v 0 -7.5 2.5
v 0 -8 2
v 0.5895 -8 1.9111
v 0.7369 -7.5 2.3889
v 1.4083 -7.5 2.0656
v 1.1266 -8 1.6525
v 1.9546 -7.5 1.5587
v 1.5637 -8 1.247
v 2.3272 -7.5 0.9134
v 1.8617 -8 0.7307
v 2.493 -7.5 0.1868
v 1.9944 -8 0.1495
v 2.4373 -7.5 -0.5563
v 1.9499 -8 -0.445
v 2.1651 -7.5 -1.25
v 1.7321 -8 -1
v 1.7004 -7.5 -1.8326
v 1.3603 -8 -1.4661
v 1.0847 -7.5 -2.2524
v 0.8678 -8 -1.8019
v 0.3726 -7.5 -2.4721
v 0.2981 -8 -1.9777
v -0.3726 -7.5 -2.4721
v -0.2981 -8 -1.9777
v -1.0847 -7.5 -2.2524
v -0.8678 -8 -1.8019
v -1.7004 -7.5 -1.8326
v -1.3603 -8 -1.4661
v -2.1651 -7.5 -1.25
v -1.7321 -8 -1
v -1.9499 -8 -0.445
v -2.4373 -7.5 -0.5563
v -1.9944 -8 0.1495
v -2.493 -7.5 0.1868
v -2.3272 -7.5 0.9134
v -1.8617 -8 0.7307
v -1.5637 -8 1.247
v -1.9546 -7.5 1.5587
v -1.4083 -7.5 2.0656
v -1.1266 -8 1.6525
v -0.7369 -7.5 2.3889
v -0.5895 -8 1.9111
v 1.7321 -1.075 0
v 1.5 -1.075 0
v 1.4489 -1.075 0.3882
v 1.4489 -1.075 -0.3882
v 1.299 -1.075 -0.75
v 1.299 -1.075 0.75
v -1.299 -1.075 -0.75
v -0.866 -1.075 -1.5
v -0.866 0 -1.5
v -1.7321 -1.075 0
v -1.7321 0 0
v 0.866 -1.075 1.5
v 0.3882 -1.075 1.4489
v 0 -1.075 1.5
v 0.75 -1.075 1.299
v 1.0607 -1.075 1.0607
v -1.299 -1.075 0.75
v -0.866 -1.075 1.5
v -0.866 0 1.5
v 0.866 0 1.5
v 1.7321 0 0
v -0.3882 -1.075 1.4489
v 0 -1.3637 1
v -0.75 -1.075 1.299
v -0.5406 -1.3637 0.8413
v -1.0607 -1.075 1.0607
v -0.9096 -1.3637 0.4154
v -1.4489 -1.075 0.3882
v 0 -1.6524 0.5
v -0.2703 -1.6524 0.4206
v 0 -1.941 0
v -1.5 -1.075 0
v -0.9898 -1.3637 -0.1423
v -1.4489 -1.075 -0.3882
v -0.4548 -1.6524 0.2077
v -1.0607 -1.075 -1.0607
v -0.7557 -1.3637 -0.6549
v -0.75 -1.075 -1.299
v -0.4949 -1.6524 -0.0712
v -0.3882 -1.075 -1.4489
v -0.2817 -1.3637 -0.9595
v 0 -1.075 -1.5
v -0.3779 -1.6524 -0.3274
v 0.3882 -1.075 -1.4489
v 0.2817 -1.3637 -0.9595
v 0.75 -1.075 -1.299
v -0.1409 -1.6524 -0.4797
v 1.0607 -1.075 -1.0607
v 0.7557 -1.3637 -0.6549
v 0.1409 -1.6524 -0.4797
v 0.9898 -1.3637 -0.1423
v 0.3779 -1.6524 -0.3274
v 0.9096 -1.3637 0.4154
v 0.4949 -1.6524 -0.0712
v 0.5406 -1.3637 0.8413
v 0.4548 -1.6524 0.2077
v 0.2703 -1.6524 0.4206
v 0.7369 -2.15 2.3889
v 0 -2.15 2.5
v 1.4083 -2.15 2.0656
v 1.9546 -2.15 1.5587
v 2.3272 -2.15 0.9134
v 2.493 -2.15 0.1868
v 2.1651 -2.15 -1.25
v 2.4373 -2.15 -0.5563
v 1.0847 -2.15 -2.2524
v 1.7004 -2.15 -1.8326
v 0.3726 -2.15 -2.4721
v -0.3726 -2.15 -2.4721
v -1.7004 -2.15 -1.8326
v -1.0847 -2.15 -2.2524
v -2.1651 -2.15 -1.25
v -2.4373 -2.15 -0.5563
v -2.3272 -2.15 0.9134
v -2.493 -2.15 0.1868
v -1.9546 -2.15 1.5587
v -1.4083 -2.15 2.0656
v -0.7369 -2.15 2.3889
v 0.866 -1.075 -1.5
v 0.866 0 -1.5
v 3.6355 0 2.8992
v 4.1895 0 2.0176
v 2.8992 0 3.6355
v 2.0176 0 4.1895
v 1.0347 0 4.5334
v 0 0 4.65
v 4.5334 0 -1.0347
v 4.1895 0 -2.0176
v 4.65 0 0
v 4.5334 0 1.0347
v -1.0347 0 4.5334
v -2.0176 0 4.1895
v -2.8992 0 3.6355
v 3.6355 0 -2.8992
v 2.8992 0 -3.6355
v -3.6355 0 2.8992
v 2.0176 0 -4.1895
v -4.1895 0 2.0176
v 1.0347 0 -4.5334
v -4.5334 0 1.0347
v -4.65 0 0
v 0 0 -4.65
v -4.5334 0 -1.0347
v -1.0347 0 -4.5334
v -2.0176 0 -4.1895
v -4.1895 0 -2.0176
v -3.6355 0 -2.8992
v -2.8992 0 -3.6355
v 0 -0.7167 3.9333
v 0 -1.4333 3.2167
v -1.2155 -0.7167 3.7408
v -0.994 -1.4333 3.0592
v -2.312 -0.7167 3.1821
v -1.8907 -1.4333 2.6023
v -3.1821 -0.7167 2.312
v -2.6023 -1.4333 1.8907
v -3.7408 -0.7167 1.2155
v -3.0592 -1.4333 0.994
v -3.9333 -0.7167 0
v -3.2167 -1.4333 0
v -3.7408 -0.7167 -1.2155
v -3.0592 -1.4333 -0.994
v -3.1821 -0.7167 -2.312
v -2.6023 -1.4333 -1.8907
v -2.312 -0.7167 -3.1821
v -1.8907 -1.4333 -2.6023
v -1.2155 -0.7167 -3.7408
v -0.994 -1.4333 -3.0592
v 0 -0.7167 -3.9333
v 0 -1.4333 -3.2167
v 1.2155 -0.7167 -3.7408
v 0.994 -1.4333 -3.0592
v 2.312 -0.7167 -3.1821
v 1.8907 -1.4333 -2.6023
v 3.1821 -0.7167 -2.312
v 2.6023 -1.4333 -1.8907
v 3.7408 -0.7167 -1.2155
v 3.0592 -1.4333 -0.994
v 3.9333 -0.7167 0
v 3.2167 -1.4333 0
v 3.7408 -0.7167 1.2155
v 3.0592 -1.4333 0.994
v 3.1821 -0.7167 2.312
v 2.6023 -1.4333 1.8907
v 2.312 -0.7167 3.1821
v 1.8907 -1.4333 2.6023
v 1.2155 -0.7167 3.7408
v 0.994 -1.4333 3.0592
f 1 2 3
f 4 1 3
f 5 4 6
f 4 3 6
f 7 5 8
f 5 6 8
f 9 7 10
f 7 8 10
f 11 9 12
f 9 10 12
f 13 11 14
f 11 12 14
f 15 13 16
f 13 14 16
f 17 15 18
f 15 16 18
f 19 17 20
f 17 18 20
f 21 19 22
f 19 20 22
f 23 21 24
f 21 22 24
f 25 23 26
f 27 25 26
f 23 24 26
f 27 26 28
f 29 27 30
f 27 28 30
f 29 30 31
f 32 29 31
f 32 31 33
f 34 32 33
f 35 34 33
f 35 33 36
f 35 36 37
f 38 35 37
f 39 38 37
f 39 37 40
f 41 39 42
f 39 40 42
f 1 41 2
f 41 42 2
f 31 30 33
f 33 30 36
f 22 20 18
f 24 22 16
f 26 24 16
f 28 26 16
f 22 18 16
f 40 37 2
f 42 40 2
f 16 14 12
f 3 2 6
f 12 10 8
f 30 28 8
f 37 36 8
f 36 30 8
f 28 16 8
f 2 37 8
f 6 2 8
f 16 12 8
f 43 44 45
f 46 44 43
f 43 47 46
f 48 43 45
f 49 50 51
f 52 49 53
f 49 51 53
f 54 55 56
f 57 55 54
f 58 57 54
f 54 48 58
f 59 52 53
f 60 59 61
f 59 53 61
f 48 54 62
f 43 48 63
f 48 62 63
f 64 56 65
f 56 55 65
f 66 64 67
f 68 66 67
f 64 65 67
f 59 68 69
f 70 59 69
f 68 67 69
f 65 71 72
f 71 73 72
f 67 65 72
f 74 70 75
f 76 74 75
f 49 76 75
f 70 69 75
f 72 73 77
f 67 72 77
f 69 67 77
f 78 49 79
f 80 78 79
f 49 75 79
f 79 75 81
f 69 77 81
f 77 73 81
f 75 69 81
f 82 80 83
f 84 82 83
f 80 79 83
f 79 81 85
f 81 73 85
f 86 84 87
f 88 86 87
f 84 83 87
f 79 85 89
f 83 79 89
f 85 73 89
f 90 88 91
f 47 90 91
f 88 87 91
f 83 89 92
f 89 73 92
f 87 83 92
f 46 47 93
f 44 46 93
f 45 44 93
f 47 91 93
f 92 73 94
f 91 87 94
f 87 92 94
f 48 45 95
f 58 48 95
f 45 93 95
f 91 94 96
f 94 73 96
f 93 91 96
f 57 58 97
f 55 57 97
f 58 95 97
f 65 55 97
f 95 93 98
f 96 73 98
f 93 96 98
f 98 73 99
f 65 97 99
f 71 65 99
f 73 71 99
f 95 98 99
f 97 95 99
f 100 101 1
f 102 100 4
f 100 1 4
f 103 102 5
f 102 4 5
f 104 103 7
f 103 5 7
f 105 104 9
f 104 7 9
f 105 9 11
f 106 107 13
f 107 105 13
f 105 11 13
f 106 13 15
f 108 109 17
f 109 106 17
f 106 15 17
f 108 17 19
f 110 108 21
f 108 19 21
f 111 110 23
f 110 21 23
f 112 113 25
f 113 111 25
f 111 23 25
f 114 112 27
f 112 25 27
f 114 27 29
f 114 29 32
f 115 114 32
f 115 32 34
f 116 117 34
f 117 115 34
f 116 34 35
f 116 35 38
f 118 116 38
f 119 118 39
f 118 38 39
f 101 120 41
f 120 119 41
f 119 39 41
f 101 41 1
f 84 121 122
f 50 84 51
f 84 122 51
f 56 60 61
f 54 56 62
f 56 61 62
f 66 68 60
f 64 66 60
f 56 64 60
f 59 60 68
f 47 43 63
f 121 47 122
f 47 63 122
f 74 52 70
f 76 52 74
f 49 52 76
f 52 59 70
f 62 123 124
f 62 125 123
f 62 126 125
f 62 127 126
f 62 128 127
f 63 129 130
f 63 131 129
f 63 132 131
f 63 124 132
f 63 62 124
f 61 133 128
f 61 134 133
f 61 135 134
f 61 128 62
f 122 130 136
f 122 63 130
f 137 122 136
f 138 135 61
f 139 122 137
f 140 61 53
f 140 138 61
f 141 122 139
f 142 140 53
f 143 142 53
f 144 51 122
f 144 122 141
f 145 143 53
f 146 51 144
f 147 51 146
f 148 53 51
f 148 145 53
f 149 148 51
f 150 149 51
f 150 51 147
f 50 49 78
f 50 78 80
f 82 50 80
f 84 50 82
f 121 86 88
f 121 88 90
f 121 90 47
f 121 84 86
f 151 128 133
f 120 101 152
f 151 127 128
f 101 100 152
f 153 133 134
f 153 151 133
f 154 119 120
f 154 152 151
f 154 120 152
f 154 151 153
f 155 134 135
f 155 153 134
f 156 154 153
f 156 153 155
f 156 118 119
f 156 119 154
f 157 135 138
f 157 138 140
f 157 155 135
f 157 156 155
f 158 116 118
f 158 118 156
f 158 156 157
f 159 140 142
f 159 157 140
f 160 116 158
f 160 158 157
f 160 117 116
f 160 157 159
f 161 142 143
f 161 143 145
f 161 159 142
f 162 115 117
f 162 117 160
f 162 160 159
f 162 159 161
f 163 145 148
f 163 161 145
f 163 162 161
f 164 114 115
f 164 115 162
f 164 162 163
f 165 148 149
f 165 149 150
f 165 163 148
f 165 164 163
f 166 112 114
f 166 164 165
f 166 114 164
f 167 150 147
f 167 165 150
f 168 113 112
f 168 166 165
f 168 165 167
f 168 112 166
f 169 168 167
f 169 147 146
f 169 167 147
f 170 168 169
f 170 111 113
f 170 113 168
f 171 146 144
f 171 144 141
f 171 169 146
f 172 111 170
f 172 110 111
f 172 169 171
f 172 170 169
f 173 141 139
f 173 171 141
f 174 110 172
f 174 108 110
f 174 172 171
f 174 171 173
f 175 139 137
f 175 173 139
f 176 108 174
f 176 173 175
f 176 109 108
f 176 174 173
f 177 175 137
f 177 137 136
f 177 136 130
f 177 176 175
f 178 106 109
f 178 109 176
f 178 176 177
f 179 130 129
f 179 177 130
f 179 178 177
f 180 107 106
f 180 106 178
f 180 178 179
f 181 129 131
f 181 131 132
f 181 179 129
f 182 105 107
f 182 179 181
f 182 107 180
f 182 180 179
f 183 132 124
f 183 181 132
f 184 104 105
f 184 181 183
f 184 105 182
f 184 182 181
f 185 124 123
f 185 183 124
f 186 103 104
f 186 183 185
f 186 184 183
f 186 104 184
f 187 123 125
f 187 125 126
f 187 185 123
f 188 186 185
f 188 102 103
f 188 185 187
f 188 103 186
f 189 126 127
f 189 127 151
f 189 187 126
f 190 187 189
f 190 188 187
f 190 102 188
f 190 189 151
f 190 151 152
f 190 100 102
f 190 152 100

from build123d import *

# Parameters (mm, degrees)
TIGE_START              = -8
ESQUISSE1_R             = 2.5
TIGE_DEPTH              = 8
CHANFREIN_D_ENTR_E_SIZE = 0.5
HEXAGONE_DEPTH          = 1.075


with BuildPart() as part:
    # Esquisse1 → Tige (new body)
    with BuildSketch(Plane(origin=(0, 0, 0), x_dir=(1, 0, 0), z_dir=(0, 1, 0)).offset(TIGE_START)):
        with Locations(Location((0, 0, 0), (0, 0, 270))):
            Circle(ESQUISSE1_R)
    extrude(amount=TIGE_DEPTH)

    # Chanfrein d'entrée
    chanfrein_d_entr_e_edges = [part.edges().sort_by_distance(p)[0] for p in [
        (0, -8, -2.5),
    ]]
    chamfer(chanfrein_d_entr_e_edges, length=CHANFREIN_D_ENTR_E_SIZE)

    # Esquisse2 → Tête (revolve)
    with BuildSketch(Plane.XY, mode=Mode.PRIVATE) as t_te_sk:
        Polygon((0, 0), (4.65, 0), (2.5, -2.15), (0, -2.15), align=None)
    revolve(t_te_sk.sketch.rotate(Axis((0, 0, 0), (0, -1, 0)), 90), axis=Axis((0, 0, 0), (0, -1, 0)))

    # Esquisse3 → Perçage (revolve, cut)
    with BuildSketch(Plane.XY, mode=Mode.PRIVATE) as per_age_sk:
        Polygon((1.5, 0), (1.5, -1.075), (0, -1.941025404), (0, 0), align=None)
    revolve(per_age_sk.sketch.rotate(Axis((0, 0, 0), (0, -1, 0)), 90), axis=Axis((0, 0, 0), (0, -1, 0)), mode=Mode.SUBTRACT)

    # Esquisse5 → Hexagone (cut)
    with BuildSketch(Plane(origin=(0, 0, 0), x_dir=(1, 0, 0), z_dir=(0, 1, 0))):
        Polygon((0.866025404, 1.5), (-0.866025404, 1.5), (-1.732050808, 0), (-0.866025404, -1.5), (0.866025404, -1.5), (1.732050808, 0), align=None)
    extrude(amount=-HEXAGONE_DEPTH, mode=Mode.SUBTRACT)


solid = part.part
